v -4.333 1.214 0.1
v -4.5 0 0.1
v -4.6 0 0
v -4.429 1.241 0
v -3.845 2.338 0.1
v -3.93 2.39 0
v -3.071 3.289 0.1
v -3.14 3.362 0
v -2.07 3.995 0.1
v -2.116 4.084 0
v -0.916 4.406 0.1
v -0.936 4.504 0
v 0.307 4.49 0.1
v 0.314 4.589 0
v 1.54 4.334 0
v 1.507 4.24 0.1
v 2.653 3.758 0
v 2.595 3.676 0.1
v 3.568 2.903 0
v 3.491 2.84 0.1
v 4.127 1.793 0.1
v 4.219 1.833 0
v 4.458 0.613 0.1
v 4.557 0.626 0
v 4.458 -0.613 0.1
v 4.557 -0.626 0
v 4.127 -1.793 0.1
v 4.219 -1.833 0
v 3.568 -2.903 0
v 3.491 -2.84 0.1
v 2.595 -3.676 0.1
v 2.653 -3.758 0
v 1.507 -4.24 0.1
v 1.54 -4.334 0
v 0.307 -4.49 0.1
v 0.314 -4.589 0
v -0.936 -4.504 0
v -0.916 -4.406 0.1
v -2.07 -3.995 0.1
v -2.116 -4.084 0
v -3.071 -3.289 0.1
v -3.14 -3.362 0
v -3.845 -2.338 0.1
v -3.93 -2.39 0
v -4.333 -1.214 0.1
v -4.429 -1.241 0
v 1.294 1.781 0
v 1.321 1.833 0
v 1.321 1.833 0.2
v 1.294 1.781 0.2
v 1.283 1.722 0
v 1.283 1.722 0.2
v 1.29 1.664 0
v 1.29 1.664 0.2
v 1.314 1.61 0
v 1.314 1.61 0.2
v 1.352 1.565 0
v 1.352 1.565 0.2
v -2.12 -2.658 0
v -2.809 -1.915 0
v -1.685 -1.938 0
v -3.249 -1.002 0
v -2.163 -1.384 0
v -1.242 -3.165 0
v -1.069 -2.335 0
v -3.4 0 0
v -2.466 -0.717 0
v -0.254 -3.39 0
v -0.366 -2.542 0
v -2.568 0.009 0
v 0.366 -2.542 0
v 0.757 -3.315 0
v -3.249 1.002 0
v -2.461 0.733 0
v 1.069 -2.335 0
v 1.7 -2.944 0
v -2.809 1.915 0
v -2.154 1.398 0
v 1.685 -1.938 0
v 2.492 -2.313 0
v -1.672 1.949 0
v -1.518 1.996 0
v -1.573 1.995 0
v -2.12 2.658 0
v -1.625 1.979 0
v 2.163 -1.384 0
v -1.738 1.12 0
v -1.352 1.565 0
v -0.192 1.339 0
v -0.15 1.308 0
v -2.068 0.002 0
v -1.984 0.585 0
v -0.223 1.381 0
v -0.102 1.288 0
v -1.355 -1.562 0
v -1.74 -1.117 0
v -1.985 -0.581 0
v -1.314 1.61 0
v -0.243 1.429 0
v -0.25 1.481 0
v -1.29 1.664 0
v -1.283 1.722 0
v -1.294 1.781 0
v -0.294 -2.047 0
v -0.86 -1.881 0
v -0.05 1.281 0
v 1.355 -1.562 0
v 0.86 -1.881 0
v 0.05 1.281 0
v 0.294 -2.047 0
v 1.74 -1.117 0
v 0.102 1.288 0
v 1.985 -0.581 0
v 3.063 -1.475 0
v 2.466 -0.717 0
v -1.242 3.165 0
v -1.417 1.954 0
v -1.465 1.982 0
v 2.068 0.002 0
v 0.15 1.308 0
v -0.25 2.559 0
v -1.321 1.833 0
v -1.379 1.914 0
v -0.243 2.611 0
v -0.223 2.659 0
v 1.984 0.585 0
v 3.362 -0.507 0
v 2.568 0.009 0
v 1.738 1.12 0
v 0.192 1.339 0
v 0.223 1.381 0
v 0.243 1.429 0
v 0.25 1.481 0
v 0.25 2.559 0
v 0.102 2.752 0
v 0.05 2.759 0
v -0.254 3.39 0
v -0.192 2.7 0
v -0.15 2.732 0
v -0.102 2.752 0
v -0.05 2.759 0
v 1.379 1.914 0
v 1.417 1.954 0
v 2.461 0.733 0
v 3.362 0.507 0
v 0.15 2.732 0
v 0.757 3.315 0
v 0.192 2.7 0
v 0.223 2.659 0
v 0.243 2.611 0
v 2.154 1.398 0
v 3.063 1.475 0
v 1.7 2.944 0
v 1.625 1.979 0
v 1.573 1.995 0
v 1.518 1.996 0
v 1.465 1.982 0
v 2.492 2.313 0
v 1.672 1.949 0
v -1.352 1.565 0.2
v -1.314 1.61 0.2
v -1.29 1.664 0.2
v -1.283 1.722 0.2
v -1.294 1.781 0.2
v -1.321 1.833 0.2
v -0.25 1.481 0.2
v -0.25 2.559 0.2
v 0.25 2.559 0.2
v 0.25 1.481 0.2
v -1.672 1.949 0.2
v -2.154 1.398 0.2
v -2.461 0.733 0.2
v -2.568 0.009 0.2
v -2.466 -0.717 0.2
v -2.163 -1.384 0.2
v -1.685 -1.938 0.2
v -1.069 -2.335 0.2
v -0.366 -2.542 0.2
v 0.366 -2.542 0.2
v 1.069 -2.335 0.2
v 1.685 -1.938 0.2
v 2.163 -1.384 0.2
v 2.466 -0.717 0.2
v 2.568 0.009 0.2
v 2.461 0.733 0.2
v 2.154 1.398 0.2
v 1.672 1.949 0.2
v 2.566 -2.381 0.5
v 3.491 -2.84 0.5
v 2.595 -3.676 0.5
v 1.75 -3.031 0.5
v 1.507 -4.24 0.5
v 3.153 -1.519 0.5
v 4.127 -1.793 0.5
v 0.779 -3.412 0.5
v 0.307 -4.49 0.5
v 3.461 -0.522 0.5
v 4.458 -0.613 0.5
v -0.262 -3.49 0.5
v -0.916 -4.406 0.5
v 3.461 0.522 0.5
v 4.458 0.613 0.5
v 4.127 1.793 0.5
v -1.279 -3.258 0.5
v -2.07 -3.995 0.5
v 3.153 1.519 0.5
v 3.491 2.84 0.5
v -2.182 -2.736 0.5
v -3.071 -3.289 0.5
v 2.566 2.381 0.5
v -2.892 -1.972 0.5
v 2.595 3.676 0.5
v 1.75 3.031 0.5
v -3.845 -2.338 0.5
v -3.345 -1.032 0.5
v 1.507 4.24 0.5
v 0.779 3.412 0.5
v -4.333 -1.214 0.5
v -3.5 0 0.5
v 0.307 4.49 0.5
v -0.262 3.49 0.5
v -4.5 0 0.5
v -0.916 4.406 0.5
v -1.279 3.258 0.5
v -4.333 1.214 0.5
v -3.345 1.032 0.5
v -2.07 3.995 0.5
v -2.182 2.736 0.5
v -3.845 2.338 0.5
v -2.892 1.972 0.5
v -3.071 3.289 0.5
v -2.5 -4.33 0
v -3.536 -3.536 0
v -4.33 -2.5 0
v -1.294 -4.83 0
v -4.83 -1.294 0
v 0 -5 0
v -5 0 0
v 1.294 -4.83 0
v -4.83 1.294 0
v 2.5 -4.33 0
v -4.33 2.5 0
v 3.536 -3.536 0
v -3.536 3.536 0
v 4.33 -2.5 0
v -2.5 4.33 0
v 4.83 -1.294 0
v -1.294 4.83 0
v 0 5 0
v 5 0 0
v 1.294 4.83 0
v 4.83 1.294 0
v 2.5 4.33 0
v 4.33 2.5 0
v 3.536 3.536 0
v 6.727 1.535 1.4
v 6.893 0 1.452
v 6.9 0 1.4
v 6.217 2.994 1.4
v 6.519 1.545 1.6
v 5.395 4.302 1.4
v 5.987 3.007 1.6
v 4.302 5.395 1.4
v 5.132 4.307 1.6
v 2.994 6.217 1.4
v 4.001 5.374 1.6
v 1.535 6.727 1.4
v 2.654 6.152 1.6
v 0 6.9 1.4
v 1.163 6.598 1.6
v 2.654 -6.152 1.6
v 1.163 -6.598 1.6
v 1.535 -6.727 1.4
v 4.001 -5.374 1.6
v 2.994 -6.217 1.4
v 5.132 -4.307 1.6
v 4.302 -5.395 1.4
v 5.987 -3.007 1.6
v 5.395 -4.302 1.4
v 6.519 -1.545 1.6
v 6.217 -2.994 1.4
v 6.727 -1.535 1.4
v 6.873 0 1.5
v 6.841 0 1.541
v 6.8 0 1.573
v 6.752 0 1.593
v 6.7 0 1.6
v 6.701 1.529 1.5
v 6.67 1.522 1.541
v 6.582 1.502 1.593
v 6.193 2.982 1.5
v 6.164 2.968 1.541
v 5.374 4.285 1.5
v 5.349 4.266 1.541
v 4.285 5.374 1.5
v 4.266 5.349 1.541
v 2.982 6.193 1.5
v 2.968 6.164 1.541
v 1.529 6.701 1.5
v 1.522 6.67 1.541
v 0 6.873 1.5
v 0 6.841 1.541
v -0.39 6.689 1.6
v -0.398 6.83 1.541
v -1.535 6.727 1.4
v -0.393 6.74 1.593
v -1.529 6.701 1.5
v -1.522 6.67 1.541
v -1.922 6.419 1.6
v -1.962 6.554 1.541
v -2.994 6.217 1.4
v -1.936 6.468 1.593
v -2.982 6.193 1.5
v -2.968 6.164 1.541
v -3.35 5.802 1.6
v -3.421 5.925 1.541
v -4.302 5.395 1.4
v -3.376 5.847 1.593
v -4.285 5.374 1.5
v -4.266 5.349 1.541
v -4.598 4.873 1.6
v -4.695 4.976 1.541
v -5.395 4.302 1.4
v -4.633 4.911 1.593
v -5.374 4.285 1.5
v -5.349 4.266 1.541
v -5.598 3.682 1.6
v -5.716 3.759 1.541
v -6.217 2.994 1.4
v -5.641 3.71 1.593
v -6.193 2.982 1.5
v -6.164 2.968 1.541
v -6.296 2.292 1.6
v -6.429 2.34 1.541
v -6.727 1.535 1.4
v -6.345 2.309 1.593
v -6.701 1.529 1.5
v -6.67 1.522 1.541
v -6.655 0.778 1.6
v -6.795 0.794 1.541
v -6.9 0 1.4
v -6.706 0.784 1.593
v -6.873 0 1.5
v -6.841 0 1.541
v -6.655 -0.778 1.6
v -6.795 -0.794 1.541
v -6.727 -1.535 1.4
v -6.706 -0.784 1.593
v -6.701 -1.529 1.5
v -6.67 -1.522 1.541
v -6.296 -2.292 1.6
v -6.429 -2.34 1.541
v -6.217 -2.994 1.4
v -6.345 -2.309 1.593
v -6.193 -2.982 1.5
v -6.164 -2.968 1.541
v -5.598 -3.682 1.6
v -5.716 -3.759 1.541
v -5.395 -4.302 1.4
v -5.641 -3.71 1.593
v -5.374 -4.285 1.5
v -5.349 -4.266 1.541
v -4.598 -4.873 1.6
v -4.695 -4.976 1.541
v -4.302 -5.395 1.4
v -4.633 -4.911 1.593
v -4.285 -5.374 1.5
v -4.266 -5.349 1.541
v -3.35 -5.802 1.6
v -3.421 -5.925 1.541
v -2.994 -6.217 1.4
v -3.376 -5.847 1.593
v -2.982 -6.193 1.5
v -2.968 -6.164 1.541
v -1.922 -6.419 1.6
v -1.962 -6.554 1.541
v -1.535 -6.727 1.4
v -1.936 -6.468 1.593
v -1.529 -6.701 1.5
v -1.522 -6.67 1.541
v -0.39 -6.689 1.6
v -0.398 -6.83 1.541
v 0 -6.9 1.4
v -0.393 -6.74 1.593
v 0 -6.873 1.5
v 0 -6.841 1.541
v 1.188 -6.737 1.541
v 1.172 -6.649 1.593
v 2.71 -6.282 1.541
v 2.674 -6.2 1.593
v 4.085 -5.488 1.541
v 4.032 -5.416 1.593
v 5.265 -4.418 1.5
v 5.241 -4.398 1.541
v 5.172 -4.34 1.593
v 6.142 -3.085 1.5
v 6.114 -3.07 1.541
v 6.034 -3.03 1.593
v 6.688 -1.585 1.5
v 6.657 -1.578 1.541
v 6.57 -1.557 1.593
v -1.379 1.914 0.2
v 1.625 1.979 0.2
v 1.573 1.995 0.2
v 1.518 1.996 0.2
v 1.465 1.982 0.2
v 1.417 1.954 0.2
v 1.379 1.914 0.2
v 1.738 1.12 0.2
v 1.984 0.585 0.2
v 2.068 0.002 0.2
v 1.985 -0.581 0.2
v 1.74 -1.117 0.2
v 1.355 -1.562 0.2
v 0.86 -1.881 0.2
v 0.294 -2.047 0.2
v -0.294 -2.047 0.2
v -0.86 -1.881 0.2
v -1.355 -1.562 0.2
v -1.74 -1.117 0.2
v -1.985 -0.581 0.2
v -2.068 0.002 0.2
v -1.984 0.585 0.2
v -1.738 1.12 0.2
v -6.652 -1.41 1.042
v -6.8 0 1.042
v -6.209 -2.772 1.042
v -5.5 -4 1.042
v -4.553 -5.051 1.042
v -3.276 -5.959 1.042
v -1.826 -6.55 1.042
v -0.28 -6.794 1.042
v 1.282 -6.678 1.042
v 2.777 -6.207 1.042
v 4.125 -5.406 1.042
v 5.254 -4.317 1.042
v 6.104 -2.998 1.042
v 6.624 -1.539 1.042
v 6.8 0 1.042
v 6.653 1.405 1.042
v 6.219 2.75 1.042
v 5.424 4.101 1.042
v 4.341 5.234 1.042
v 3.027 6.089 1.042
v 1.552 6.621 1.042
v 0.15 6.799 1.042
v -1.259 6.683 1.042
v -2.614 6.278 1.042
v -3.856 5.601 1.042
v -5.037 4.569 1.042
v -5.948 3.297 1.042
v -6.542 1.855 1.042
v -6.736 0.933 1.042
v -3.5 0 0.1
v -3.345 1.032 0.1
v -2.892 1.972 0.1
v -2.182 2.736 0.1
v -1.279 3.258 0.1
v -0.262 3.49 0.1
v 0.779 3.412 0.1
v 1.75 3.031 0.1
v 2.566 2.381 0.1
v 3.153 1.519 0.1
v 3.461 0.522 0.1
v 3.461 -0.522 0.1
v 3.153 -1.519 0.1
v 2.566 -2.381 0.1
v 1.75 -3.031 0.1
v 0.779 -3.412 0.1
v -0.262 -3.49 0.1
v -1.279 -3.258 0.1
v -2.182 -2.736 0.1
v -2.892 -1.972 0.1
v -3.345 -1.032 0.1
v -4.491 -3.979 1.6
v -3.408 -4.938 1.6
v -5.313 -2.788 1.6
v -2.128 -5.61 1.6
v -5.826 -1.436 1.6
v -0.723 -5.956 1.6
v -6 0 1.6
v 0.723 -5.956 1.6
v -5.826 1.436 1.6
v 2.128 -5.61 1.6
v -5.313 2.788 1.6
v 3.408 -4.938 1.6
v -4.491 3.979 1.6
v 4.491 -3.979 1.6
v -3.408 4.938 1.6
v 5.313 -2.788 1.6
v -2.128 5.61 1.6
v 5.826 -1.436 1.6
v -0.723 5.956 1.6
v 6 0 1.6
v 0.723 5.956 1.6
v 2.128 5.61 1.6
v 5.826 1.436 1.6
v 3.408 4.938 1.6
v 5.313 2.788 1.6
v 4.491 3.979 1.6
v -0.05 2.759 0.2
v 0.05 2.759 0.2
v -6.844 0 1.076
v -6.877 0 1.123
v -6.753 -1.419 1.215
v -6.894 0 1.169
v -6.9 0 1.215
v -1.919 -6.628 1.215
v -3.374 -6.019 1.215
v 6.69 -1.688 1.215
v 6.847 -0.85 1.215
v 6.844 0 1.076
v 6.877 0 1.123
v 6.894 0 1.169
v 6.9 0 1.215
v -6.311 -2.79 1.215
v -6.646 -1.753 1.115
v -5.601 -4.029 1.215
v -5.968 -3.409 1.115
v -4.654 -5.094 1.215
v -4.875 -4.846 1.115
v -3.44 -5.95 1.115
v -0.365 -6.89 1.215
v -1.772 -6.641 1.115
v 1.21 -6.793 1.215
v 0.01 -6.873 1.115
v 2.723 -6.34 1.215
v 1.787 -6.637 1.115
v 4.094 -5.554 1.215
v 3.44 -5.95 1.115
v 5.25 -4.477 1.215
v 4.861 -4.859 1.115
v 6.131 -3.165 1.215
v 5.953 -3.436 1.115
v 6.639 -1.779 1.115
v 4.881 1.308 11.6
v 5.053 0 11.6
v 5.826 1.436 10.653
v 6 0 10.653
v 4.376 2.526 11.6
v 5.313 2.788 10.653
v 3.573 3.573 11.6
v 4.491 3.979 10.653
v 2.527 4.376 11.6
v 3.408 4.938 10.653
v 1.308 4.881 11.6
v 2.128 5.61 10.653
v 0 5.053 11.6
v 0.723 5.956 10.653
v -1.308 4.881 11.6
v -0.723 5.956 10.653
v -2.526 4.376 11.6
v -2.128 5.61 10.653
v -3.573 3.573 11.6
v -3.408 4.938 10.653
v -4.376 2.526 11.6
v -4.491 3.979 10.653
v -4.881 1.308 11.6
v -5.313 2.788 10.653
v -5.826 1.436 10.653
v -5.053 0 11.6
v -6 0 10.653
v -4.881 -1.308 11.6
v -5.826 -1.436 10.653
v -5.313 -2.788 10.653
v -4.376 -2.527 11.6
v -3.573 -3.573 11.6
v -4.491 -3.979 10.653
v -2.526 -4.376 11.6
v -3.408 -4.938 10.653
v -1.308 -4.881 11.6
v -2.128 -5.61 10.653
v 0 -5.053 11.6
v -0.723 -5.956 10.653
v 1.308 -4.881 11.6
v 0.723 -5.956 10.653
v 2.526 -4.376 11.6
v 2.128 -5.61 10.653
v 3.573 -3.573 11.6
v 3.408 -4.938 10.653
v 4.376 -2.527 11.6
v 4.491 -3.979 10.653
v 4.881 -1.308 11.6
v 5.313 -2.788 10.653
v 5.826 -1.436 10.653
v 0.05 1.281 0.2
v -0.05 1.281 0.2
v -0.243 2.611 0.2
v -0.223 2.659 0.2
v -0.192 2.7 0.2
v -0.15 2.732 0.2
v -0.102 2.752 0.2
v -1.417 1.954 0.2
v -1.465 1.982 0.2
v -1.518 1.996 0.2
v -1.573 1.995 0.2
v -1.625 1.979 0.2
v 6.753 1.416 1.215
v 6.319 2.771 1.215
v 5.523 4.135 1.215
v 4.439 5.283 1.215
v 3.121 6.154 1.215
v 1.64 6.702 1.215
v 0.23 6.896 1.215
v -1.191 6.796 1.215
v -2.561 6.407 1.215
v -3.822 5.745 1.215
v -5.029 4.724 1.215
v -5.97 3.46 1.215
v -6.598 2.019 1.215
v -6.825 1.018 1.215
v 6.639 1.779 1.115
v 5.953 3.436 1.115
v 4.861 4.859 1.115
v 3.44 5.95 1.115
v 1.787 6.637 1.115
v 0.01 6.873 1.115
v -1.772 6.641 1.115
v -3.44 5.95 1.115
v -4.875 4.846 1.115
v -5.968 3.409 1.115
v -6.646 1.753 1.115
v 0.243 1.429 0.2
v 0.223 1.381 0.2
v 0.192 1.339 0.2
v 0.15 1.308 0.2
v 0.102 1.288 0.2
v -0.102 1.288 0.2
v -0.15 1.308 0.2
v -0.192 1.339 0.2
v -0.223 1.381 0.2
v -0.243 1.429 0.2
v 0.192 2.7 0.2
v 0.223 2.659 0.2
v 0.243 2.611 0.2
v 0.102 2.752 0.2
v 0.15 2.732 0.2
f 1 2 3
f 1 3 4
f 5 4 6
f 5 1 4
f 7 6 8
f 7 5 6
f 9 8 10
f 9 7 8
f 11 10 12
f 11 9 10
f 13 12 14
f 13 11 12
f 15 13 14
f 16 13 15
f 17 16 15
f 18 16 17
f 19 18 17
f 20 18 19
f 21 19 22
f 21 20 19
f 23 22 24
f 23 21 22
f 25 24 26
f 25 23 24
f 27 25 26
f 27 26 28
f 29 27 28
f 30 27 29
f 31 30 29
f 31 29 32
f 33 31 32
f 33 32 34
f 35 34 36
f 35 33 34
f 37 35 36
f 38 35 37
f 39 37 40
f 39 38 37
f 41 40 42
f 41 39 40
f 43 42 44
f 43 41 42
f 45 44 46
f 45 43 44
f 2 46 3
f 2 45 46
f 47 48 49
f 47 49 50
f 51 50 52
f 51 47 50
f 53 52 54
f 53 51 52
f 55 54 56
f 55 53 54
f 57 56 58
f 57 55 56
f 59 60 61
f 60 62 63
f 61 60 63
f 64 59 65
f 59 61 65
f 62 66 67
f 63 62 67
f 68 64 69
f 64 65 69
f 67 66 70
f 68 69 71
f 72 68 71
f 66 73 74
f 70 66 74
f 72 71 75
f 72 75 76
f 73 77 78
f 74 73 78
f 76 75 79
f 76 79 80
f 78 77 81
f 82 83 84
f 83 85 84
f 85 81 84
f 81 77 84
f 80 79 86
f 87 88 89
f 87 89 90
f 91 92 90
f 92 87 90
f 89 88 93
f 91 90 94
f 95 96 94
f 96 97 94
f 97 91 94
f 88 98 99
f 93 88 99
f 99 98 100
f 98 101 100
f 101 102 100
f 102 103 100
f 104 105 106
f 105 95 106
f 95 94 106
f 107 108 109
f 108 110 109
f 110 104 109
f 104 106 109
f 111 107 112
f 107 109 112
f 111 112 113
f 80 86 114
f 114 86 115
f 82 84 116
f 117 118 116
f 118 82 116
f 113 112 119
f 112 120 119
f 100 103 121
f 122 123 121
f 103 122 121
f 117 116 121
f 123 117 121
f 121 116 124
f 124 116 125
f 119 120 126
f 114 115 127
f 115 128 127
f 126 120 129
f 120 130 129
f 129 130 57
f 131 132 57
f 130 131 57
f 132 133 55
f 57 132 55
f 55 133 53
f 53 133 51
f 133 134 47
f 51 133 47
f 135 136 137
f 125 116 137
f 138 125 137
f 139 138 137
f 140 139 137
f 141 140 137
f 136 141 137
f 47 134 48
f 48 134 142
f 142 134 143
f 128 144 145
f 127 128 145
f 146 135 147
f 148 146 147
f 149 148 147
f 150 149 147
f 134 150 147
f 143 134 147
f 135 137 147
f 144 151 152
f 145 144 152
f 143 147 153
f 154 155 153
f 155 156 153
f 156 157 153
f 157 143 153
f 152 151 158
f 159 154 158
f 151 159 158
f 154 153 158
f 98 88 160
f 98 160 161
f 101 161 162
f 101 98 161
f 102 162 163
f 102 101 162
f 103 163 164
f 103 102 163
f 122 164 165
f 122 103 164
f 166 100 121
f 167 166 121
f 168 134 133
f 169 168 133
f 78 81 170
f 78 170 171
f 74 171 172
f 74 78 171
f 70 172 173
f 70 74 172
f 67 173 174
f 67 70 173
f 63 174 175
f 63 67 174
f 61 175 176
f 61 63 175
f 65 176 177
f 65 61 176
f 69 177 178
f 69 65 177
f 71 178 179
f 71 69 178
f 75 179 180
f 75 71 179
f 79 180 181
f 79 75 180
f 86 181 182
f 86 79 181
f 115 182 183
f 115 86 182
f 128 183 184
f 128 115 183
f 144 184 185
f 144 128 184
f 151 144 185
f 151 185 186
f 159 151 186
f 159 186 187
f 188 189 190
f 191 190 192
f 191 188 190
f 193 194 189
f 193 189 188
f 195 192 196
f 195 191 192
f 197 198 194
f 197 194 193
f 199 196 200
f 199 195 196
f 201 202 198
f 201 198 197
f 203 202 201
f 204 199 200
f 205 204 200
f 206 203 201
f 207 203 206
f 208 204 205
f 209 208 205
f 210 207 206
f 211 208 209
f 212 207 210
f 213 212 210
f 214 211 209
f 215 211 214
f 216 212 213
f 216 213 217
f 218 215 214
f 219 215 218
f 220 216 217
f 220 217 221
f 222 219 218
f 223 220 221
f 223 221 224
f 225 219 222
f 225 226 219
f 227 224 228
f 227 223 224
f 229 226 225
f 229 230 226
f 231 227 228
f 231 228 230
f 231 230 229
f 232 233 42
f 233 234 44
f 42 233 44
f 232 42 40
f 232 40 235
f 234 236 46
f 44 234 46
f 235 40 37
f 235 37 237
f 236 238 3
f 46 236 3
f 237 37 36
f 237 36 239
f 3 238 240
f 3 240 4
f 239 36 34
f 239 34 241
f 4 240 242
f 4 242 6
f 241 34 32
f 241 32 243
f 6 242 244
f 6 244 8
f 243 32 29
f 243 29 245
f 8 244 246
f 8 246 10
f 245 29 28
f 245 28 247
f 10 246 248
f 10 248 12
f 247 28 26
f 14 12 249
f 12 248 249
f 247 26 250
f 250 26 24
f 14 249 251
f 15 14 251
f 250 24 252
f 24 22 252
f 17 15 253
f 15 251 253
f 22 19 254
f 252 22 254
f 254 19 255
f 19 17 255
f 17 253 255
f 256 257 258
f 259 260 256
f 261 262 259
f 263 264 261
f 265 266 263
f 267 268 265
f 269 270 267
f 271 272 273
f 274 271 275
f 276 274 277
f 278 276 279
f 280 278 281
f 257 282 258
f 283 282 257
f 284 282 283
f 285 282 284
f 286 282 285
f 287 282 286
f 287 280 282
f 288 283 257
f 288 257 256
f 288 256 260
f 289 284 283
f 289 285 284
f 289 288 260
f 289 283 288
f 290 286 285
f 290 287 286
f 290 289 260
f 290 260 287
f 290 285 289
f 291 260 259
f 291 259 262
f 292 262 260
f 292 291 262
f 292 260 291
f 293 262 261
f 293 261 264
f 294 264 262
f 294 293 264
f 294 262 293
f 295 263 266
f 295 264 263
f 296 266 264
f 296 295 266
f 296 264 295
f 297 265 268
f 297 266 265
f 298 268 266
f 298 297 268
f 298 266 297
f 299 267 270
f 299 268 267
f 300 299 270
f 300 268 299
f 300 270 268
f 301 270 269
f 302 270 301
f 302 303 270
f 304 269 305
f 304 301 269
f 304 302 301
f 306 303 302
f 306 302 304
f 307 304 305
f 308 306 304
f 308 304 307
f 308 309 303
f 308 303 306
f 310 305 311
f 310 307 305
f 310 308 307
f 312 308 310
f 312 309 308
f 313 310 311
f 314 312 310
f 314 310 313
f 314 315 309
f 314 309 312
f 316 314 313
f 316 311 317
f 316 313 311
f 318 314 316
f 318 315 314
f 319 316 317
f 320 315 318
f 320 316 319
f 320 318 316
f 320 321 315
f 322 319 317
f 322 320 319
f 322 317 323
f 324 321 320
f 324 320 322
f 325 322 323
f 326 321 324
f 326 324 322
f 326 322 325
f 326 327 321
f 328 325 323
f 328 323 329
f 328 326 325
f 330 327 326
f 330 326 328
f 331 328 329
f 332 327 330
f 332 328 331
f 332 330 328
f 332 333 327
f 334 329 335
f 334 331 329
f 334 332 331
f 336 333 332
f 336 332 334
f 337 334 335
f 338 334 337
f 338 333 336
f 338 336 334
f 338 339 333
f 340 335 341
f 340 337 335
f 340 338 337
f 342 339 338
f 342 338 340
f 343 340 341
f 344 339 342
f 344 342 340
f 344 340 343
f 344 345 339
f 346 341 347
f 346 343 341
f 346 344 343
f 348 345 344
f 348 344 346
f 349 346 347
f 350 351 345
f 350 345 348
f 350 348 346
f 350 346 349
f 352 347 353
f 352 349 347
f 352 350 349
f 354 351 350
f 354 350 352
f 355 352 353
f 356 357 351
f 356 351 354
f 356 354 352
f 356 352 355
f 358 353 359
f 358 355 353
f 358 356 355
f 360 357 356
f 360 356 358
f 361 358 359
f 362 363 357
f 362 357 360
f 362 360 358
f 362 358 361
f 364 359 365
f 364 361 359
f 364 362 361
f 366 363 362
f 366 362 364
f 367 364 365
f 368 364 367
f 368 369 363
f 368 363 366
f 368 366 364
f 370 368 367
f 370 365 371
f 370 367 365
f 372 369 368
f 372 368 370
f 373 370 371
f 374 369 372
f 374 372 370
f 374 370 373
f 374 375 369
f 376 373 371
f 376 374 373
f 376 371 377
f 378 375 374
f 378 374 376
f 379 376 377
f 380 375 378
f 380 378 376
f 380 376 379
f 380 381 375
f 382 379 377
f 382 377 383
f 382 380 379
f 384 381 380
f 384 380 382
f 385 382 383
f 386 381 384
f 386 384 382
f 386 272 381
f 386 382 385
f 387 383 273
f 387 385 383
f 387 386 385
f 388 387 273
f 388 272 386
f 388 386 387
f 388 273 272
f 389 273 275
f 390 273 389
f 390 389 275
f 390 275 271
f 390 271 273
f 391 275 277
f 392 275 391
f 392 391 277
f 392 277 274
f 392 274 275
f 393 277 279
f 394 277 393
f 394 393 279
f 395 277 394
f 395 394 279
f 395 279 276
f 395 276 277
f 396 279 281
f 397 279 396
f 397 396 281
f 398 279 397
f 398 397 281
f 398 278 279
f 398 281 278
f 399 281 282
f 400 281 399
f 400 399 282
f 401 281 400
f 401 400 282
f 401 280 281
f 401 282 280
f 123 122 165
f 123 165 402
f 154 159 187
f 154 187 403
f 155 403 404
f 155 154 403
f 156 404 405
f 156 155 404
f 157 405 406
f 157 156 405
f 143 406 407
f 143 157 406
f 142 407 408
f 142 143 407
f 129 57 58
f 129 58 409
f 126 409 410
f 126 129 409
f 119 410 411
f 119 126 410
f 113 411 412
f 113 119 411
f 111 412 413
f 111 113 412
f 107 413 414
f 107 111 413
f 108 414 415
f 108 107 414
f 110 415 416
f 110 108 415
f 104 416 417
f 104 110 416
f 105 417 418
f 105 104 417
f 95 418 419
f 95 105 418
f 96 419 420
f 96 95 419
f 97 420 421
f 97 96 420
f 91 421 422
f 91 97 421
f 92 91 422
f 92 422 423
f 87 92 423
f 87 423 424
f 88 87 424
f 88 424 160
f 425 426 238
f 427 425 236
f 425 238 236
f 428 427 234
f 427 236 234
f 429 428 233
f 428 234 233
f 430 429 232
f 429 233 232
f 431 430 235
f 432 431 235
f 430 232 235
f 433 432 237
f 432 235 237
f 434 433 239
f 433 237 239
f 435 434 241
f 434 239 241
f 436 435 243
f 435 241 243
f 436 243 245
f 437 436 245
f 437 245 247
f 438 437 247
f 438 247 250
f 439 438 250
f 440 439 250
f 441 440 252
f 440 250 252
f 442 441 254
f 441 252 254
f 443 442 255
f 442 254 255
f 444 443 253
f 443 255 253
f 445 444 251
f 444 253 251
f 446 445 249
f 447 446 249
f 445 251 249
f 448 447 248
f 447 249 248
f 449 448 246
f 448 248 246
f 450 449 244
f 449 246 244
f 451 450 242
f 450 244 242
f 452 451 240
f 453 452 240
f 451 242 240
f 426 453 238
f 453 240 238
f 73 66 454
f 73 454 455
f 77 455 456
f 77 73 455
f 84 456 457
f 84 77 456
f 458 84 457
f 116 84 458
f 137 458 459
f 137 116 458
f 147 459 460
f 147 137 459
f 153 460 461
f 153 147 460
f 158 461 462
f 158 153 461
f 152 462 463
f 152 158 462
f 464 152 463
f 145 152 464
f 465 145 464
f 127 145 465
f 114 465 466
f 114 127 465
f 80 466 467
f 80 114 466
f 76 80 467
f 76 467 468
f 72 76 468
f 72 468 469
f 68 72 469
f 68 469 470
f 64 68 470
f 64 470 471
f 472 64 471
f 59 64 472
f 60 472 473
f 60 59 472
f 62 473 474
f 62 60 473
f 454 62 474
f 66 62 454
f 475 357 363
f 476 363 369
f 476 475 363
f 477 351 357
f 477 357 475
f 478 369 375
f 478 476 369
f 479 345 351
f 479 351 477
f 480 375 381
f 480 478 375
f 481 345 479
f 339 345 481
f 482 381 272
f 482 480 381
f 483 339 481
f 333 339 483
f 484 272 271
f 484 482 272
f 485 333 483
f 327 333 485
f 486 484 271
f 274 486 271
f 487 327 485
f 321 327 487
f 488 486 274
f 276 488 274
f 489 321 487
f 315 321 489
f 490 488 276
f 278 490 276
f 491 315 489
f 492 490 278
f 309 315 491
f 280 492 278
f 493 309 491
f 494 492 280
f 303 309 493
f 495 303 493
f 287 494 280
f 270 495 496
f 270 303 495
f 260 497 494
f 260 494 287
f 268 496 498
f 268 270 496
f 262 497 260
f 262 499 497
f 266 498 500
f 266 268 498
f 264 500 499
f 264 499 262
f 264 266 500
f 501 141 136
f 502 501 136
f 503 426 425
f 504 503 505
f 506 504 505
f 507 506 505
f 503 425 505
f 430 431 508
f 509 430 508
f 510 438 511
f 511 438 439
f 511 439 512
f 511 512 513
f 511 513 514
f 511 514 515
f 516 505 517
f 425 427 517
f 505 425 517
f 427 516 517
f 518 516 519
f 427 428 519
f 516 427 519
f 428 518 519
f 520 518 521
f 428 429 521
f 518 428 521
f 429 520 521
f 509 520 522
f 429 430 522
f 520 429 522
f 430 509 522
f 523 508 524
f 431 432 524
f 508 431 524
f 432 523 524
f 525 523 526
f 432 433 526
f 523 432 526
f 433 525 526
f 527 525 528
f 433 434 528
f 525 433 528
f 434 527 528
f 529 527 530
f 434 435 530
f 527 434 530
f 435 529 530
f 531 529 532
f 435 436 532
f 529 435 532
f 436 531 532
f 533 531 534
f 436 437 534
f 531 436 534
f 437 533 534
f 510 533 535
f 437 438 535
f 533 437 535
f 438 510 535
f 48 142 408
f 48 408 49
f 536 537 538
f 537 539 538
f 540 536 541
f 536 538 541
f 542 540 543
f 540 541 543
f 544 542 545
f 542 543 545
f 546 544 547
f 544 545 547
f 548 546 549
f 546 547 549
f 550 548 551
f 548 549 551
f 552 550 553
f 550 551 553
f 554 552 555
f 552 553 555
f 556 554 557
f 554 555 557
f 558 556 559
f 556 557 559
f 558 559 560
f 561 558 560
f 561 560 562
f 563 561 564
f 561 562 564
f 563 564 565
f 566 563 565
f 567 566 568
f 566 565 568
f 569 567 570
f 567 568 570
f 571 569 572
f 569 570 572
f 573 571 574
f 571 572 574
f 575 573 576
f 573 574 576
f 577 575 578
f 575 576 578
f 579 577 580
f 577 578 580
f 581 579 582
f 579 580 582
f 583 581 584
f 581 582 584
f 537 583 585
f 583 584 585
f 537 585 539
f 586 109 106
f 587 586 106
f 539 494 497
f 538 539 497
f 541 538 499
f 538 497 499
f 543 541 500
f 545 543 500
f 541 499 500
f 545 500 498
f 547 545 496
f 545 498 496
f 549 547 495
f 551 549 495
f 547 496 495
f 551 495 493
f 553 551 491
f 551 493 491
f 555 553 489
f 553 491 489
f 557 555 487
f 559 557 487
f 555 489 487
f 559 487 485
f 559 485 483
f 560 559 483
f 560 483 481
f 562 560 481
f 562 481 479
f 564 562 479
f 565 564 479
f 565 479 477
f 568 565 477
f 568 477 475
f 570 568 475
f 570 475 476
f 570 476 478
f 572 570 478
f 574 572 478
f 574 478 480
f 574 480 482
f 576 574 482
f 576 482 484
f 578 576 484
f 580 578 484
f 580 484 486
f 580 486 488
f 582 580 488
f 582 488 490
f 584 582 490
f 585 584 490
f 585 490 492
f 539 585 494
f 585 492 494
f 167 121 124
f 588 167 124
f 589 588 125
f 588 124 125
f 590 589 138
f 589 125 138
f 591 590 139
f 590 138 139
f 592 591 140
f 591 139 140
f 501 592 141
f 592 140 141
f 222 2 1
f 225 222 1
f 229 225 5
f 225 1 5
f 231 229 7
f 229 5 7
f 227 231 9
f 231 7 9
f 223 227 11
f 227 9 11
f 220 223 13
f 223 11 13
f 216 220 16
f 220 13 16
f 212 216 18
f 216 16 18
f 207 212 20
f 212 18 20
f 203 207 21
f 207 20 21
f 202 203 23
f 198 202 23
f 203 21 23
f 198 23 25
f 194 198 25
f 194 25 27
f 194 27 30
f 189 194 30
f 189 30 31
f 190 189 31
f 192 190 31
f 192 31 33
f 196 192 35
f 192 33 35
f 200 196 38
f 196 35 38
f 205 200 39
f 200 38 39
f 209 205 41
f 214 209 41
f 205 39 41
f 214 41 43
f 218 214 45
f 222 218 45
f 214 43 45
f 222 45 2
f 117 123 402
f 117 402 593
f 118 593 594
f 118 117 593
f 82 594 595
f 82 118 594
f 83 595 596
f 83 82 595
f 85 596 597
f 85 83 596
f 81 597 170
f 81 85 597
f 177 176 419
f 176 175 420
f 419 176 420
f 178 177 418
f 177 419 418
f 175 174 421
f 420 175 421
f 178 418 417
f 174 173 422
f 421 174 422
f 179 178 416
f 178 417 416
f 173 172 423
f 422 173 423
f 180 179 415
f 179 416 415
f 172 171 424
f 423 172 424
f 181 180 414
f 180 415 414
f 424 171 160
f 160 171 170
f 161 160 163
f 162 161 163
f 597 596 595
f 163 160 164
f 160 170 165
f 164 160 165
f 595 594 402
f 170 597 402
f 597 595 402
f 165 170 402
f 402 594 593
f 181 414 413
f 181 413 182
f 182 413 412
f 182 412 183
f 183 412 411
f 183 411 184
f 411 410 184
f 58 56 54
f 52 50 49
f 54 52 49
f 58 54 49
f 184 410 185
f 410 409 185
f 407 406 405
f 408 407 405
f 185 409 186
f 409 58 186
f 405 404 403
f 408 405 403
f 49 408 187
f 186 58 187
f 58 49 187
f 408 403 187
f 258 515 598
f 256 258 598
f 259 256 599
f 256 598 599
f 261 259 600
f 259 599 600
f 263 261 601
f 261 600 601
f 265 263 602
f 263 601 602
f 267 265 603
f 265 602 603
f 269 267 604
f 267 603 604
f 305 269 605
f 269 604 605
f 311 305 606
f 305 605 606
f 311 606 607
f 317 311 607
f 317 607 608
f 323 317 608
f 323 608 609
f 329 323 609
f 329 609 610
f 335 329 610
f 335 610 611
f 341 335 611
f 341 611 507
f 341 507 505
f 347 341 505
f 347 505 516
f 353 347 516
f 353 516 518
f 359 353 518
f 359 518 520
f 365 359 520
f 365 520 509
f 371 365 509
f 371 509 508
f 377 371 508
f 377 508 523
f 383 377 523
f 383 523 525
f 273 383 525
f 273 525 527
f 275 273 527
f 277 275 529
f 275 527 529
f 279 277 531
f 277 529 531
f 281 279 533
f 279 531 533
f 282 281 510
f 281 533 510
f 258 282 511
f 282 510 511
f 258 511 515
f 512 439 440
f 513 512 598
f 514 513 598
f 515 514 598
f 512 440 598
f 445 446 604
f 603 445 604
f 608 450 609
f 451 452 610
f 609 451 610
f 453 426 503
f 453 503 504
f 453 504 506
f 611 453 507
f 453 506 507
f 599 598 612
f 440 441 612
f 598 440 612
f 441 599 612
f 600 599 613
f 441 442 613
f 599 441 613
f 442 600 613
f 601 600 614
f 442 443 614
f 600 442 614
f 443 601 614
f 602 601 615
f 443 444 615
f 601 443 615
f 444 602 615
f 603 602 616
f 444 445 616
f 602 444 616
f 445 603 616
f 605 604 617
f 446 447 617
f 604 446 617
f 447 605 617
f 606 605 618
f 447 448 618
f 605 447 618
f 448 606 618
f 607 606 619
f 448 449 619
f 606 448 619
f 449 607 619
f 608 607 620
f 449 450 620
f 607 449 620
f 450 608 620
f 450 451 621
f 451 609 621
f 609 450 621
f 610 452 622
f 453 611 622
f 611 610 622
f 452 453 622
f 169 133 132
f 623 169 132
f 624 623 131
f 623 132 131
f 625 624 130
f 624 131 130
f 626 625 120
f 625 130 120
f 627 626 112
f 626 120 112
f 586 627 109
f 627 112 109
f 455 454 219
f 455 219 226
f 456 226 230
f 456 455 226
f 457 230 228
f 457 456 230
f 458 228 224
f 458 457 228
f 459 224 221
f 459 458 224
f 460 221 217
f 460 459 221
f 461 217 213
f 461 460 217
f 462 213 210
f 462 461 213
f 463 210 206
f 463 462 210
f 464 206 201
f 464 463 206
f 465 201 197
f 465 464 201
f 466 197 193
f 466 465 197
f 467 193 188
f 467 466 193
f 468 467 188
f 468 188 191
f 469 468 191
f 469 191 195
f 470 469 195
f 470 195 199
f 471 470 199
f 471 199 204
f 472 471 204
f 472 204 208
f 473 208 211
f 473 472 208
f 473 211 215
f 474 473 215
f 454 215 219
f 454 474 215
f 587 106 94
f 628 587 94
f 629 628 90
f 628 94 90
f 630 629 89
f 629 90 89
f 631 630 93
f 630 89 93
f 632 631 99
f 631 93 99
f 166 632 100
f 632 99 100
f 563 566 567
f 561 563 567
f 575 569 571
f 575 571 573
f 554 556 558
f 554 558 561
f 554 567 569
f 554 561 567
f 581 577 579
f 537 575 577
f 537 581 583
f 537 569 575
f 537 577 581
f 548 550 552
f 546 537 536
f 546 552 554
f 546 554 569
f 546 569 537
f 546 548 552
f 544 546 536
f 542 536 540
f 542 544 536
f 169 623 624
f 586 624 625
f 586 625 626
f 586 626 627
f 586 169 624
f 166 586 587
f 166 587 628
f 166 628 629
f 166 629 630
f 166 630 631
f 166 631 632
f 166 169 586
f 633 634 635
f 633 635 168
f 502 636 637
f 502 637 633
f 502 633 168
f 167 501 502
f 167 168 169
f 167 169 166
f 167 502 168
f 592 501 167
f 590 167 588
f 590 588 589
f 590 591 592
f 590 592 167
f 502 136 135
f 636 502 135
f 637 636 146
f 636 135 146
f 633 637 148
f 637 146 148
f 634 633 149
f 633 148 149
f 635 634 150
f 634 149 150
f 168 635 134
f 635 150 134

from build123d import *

# Parameters (mm, degrees)
SKETCH_2_R          = 6.9
EXTRUDE_1_DEPTH     = 1.6
SKETCH_4_R          = 6
EXTRUDE_2_DEPTH     = 10
SKETCH_7_R          = 4.5
SKETCH_7_R_2        = 3.5
CUT_EXTRUDE_1_DEPTH = 0.5
CUT_EXTRUDE_2_DEPTH = 0.2
CHAMFER_1_SIZE      = 0.1
FILLET_1_R          = 0.2


# Read off the part's stored shape, not the designer's step: M12 机械螺纹 螺柱1
with BuildPart() as part:
    # 草图2 → 凸台-拉伸1 (new body)
    with BuildSketch(Plane.XY):
        Circle(SKETCH_2_R)
    extrude(amount=EXTRUDE_1_DEPTH)

    # 草图3 → 切除-旋转1 (revolve, cut)
    with BuildSketch(Plane(origin=(0, 0, 0), x_dir=(1, 0, 0), z_dir=(0, 1, 0))):
        Polygon((-6.9, -1.1), (-5, 0), (-6.9, 0), align=None)
    revolve(axis=Axis((0, 0, -2.565533084), (0, 0, 1)), mode=Mode.SUBTRACT)

    # 草图4 → 凸台-拉伸2 (add)
    with BuildSketch(Plane.XY.offset(1.6)):
        Circle(SKETCH_4_R)
    extrude(amount=EXTRUDE_2_DEPTH)

    # M12 机械螺纹 螺柱1 outline → M12 机械螺纹 螺柱1 (revolve, cut)
    with BuildSketch(Plane.XZ):
        Polygon((6, 11.6), (5.053, 11.6), (6, 10.653), align=None)
    revolve(axis=Axis((0, 0, 0), (0, 0, 1)), mode=Mode.SUBTRACT)

    # 草图7 → 切除-拉伸1 (cut)
    with BuildSketch(Plane(origin=(0, 0, 0), x_dir=(-1, 0, 0), z_dir=(0, 0, -1))):
        Circle(SKETCH_7_R)
        Circle(SKETCH_7_R_2, mode=Mode.SUBTRACT)
    extrude(amount=-CUT_EXTRUDE_1_DEPTH, mode=Mode.SUBTRACT)

    # 草图8 → 切除-拉伸2 (cut)
    with BuildSketch(Plane(origin=(0, 0, 0), x_dir=(-1, 0, 0), z_dir=(0, 0, -1))):
        with BuildLine():
            Line((1.320582444, 1.833045199), (1.379254836, 1.91448589))
            ThreePointArc((1.379254836, 1.91448589), (1.517822019, 1.996168929), (1.671723162, 1.949399054))
            ThreePointArc((1.671723162, 1.949399054), (0, -2.568037189), (-1.671723162, 1.949399054))
            ThreePointArc((-1.671723162, 1.949399054), (-1.517822019, 1.996168929), (-1.379254836, 1.91448589))
            Line((-1.379254836, 1.91448589), (-1.320582444, 1.833045199))
            ThreePointArc((-1.320582444, 1.833045199), (-1.284222156, 1.69280287), (-1.352094962, 1.564805747))
            ThreePointArc((-1.352094962, 1.564805747), (0, -2.068037189), (1.352094962, 1.564805747))
            ThreePointArc((1.352094962, 1.564805747), (1.284222156, 1.69280287), (1.320582444, 1.833045199))
        make_face()
        with BuildLine():
            Line((-0.050187239, 1.280793561), (0.050187239, 1.280793561))
            ThreePointArc((0.050187239, 1.280793561), (0.191608596, 1.339372204), (0.250187239, 1.480793561))
            Line((0.250187239, 1.480793561), (0.250187239, 2.558804723))
            ThreePointArc((0.250187239, 2.558804723), (0.191608596, 2.70022608), (0.050187239, 2.758804723))
            Line((0.050187239, 2.758804723), (-0.050187239, 2.758804723))
            ThreePointArc((-0.050187239, 2.758804723), (-0.191608596, 2.70022608), (-0.250187239, 2.558804723))
            Line((-0.250187239, 2.558804723), (-0.250187239, 1.480793561))
            ThreePointArc((-0.250187239, 1.480793561), (-0.191608596, 1.339372204), (-0.050187239, 1.280793561))
        make_face()
    extrude(amount=-CUT_EXTRUDE_2_DEPTH, mode=Mode.SUBTRACT)

    # 倒角1
    chamfer_1_edges = [part.edges().sort_by_distance(p)[0] for p in [
        (4.5, 0, 0),
        (3.5, 0, 0),
    ]]
    chamfer(chamfer_1_edges, length=CHAMFER_1_SIZE)

    # 圆角1
    fillet_1_edges = [part.edges().sort_by_distance(p)[0] for p in [
        (-6.9, 0, 1.6),
        (0, 6.9, 1.1),
    ]]
    fillet(fillet_1_edges, radius=FILLET_1_R)


solid = part.part
